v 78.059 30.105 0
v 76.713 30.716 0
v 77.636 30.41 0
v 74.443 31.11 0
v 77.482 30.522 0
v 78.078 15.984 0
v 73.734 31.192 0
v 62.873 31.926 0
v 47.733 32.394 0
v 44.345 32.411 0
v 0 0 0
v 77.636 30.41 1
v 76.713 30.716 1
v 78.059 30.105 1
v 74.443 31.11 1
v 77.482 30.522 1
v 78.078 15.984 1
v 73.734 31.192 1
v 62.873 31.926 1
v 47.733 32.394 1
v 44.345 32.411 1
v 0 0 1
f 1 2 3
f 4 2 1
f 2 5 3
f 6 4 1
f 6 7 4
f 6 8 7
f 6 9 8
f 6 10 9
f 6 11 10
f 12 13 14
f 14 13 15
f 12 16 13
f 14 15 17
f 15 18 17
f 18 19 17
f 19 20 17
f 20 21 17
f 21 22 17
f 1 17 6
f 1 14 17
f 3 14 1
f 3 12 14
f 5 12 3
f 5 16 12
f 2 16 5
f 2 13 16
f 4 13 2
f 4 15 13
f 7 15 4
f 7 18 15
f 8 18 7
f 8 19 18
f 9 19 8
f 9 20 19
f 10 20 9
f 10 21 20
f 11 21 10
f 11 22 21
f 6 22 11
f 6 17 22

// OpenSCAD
// Generated by SolidPython 1.1.3 on 2024-05-19 23:35:49


linear_extrude(height = 1) {
	polygon(points = [[0, 0], [78.0776399414, 15.9844062500], [78.0775609375, 16.0430000000], [78.0774819336, 16.1015937500], [78.0774029297, 16.1601875000], [78.0773239258, 16.2187812500], [78.0772449219, 16.2773750000], [78.0771659180, 16.3359687500], [78.0770869141, 16.3945625000], [78.0770079102, 16.4531562500], [78.0769289063, 16.5117500000], [78.0768499023, 16.5703437500], [78.0767708984, 16.6289375000], [78.0766918945, 16.6875312500], [78.0766128906, 16.7461250000], [78.0765338867, 16.8047187500], [78.0764548828, 16.8633125000], [78.0763758789, 16.9219062500], [78.0762968750, 16.9805000000], [78.0762178711, 17.0390937500], [78.0761388672, 17.0976875000], [78.0760598633, 17.1562812500], [78.0759808594, 17.2148750000], [78.0759018555, 17.2734687500], [78.0758228516, 17.3320625000], [78.0757438477, 17.3906562500], [78.0756648437, 17.4492500000], [78.0755858398, 17.5078437500], [78.0755068359, 17.5664375000], [78.0754278320, 17.6250312500], [78.0753488281, 17.6836250000], [78.0752698242, 17.7422187500], [78.0751908203, 17.8008125000], [78.0751118164, 17.8594062500], [78.0750328125, 17.9180000000], [78.0749538086, 17.9765937500], [78.0748748047, 18.0351875000], [78.0747958008, 18.0937812500], [78.0747167969, 18.1523750000], [78.0746377930, 18.2109687500], [78.0745587891, 18.2695625000], [78.0744797852, 18.3281562500], [78.0744007813, 18.3867500000], [78.0743217773, 18.4453437500], [78.0742427734, 18.5039375000], [78.0741637695, 18.5625312500], [78.0740847656, 18.6211250000], [78.0740057617, 18.6797187500], [78.0739267578, 18.7383125000], [78.0738477539, 18.7969062500], [78.0737687500, 18.8555000000], [78.0736897461, 18.9140937500], [78.0736107422, 18.9726875000], [78.0735317383, 19.0312812500], [78.0734527344, 19.0898750000], [78.0733737305, 19.1484687500], [78.0732947266, 19.2070625000], [78.0732157227, 19.2656562500], [78.0731367187, 19.3242500000], [78.0730577148, 19.3828437500], [78.0729787109, 19.4414375000], [78.0728997070, 19.5000312500], [78.0728207031, 19.5586250000], [78.0727416992, 19.6172187500], [78.0726626953, 19.6758125000], [78.0725836914, 19.7344062500], [78.0725046875, 19.7930000000], [78.0724256836, 19.8515937500], [78.0723466797, 19.9101875000], [78.0722676758, 19.9687812500], [78.0721886719, 20.0273750000], [78.0721096680, 20.0859687500], [78.0720306641, 20.1445625000], [78.0719516602, 20.2031562500], [78.0718726563, 20.2617500000], [78.0717936523, 20.3203437500], [78.0717146484, 20.3789375000], [78.0716356445, 20.4375312500], [78.0715566406, 20.4961250000], [78.0714776367, 20.5547187500], [78.0713986328, 20.6133125000], [78.0713196289, 20.6719062500], [78.0712406250, 20.7305000000], [78.0711616211, 20.7890937500], [78.0710826172, 20.8476875000], [78.0710036133, 20.9062812500], [78.0709246094, 20.9648750000], [78.0708456055, 21.0234687500], [78.0707666016, 21.0820625000], [78.0706875977, 21.1406562500], [78.0706085937, 21.1992500000], [78.0705295898, 21.2578437500], [78.0704505859, 21.3164375000], [78.0703715820, 21.3750312500], [78.0702925781, 21.4336250000], [78.0702135742, 21.4922187500], [78.0701345703, 21.5508125000], [78.0700555664, 21.6094062500], [78.0699765625, 21.6680000000], [78.0698975586, 21.7265937500], [78.0698185547, 21.7851875000], [78.0697395508, 21.8437812500], [78.0696605469, 21.9023750000], [78.0695815430, 21.9609687500], [78.0695025391, 22.0195625000], [78.0694235352, 22.0781562500], [78.0693445313, 22.1367500000], [78.0692655273, 22.1953437500], [78.0691865234, 22.2539375000], [78.0691075195, 22.3125312500], [78.0690285156, 22.3711250000], [78.0689495117, 22.4297187500], [78.0688705078, 22.4883125000], [78.0687915039, 22.5469062500], [78.0687125000, 22.6055000000], [78.0686334961, 22.6640937500], [78.0685544922, 22.7226875000], [78.0684754883, 22.7812812500], [78.0683964844, 22.8398750000], [78.0683174805, 22.8984687500], [78.0682384766, 22.9570625000], [78.0681594727, 23.0156562500], [78.0680804687, 23.0742500000], [78.0680014648, 23.1328437500], [78.0679224609, 23.1914375000], [78.0678434570, 23.2500312500], [78.0677644531, 23.3086250000], [78.0676854492, 23.3672187500], [78.0676064453, 23.4258125000], [78.0675274414, 23.4844062500], [78.0674484375, 23.5430000000], [78.0673694336, 23.6015937500], [78.0672904297, 23.6601875000], [78.0672114258, 23.7187812500], [78.0671324219, 23.7773750000], [78.0670534180, 23.8359687500], [78.0669744141, 23.8945625000], [78.0668954102, 23.9531562500], [78.0668164063, 24.0117500000], [78.0667374023, 24.0703437500], [78.0666583984, 24.1289375000], [78.0665793945, 24.1875312500], [78.0665003906, 24.2461250000], [78.0664213867, 24.3047187500], [78.0663423828, 24.3633125000], [78.0662633789, 24.4219062500], [78.0661843750, 24.4805000000], [78.0661053711, 24.5390937500], [78.0660263672, 24.5976875000], [78.0659473633, 24.6562812500], [78.0658683594, 24.7148750000], [78.0657893555, 24.7734687500], [78.0657103516, 24.8320625000], [78.0656313477, 24.8906562500], [78.0655523437, 24.9492500000], [78.0654733398, 25.0078437500], [78.0653943359, 25.0664375000], [78.0653153320, 25.1250312500], [78.0652363281, 25.1836250000], [78.0651573242, 25.2422187500], [78.0650783203, 25.3008125000], [78.0649993164, 25.3594062500], [78.0649203125, 25.4180000000], [78.0648413086, 25.4765937500], [78.0647623047, 25.5351875000], [78.0646833008, 25.5937812500], [78.0646042969, 25.6523750000], [78.0645252930, 25.7109687500], [78.0644462891, 25.7695625000], [78.0643672852, 25.8281562500], [78.0642882813, 25.8867500000], [78.0642092773, 25.9453437500], [78.0641302734, 26.0039375000], [78.0640512695, 26.0625312500], [78.0639722656, 26.1211250000], [78.0638932617, 26.1797187500], [78.0638142578, 26.2383125000], [78.0637352539, 26.2969062500], [78.0636562500, 26.3555000000], [78.0635772461, 26.4140937500], [78.0634982422, 26.4726875000], [78.0634192383, 26.5312812500], [78.0633402344, 26.5898750000], [78.0632612305, 26.6484687500], [78.0631822266, 26.7070625000], [78.0631032227, 26.7656562500], [78.0630242188, 26.8242500000], [78.0629452148, 26.8828437500], [78.0628662109, 26.9414375000], [78.0627872070, 27.0000312500], [78.0627082031, 27.0586250000], [78.0626291992, 27.1172187500], [78.0625501953, 27.1758125000], [78.0624711914, 27.2344062500], [78.0623921875, 27.2930000000], [78.0623131836, 27.3515937500], [78.0622341797, 27.4101875000], [78.0621551758, 27.4687812500], [78.0620761719, 27.5273750000], [78.0619971680, 27.5859687500], [78.0619181641, 27.6445625000], [78.0618391602, 27.7031562500], [78.0617601563, 27.7617500000], [78.0616811523, 27.8203437500], [78.0616021484, 27.8789375000], [78.0615231445, 27.9375312500], [78.0614441406, 27.9961250000], [78.0613651367, 28.0547187500], [78.0612861328, 28.1133125000], [78.0612071289, 28.1719062500], [78.0611281250, 28.2305000000], [78.0610491211, 28.2890937500], [78.0609701172, 28.3476875000], [78.0608911133, 28.4062812500], [78.0608121094, 28.4648750000], [78.0607331055, 28.5234687500], [78.0606541016, 28.5820625000], [78.0605750977, 28.6406562500], [78.0604960938, 28.6992500000], [78.0604170898, 28.7578437500], [78.0603380859, 28.8164375000], [78.0602590820, 28.8750312500], [78.0601800781, 28.9336250000], [78.0601010742, 28.9922187500], [78.0600220703, 29.0508125000], [78.0599430664, 29.1094062500], [78.0598640625, 29.1680000000], [78.0597850586, 29.2265937500], [78.0597060547, 29.2851875000], [78.0596270508, 29.3437812500], [78.0595480469, 29.4023750000], [78.0594690430, 29.4609687500], [78.0593900391, 29.5195625000], [78.0593110352, 29.5781562500], [78.0592320312, 29.6367500000], [78.0591530273, 29.6953437500], [78.0590740234, 29.7539375000], [78.0589950195, 29.8125312500], [78.0589160156, 29.8711250000], [78.0588370117, 29.9297187500], [78.0587580078, 29.9883125000], [78.0586790039, 30.0469062500], [78.0586000000, 30.1055000000], [78.0058000000, 30.1436000000], [77.9530000000, 30.1817000000], [77.9002000000, 30.2198000000], [77.8474000000, 30.2579000000], [77.7946000000, 30.2960000000], [77.7418000000, 30.3341000000], [77.6890000000, 30.3722000000], [77.6362000000, 30.4103000000], [77.5589000000, 30.4661000000], [77.4816000000, 30.5219000000], [77.3854875000, 30.5462000000], [77.2893750000, 30.5705000000], [77.1932625000, 30.5948000000], [77.0971500000, 30.6191000000], [77.0010375000, 30.6434000000], [76.9049250000, 30.6677000000], [76.8088125000, 30.6920000000], [76.7127000000, 30.7163000000], [76.6417687500, 30.7286187500], [76.5708375000, 30.7409375000], [76.4999062500, 30.7532562500], [76.4289750000, 30.7655750000], [76.3580437500, 30.7778937500], [76.2871125000, 30.7902125000], [76.2161812500, 30.8025312500], [76.1452500000, 30.8148500000], [76.0743187500, 30.8271687500], [76.0033875000, 30.8394875000], [75.9324562500, 30.8518062500], [75.8615250000, 30.8641250000], [75.7905937500, 30.8764437500], [75.7196625000, 30.8887625000], [75.6487312500, 30.9010812500], [75.5778000000, 30.9134000000], [75.5068687500, 30.9257187500], [75.4359375000, 30.9380375000], [75.3650062500, 30.9503562500], [75.2940750000, 30.9626750000], [75.2231437500, 30.9749937500], [75.1522125000, 30.9873125000], [75.0812812500, 30.9996312500], [75.0103500000, 31.0119500000], [74.9394187500, 31.0242687500], [74.8684875000, 31.0365875000], [74.7975562500, 31.0489062500], [74.7266250000, 31.0612250000], [74.6556937500, 31.0735437500], [74.5847625000, 31.0858625000], [74.5138312500, 31.0981812500], [74.4429000000, 31.1105000000], [74.3543375000, 31.1207500000], [74.2657750000, 31.1310000000], [74.1772125000, 31.1412500000], [74.0886500000, 31.1515000000], [74.0000875000, 31.1617500000], [73.9115250000, 31.1720000000], [73.8229625000, 31.1822500000], [73.7344000000, 31.1925000000], [73.6667000000, 31.1970718750], [73.5990000000, 31.2016437500], [73.5313000000, 31.2062156250], [73.4636000000, 31.2107875000], [73.3959000000, 31.2153593750], [73.3282000000, 31.2199312500], [73.2605000000, 31.2245031250], [73.1928000000, 31.2290750000], [73.1251000000, 31.2336468750], [73.0574000000, 31.2382187500], [72.9897000000, 31.2427906250], [72.9220000000, 31.2473625000], [72.8543000000, 31.2519343750], [72.7866000000, 31.2565062500], [72.7189000000, 31.2610781250], [72.6512000000, 31.2656500000], [72.5835000000, 31.2702218750], [72.5158000000, 31.2747937500], [72.4481000000, 31.2793656250], [72.3804000000, 31.2839375000], [72.3127000000, 31.2885093750], [72.2450000000, 31.2930812500], [72.1773000000, 31.2976531250], [72.1096000000, 31.3022250000], [72.0419000000, 31.3067968750], [71.9742000000, 31.3113687500], [71.9065000000, 31.3159406250], [71.8388000000, 31.3205125000], [71.7711000000, 31.3250843750], [71.7034000000, 31.3296562500], [71.6357000000, 31.3342281250], [71.5680000000, 31.3388000000], [71.5000734375, 31.3433867187], [71.4321468750, 31.3479734375], [71.3642203125, 31.3525601563], [71.2962937500, 31.3571468750], [71.2283671875, 31.3617335937], [71.1604406250, 31.3663203125], [71.0925140625, 31.3709070312], [71.0245875000, 31.3754937500], [70.9566609375, 31.3800804687], [70.8887343750, 31.3846671875], [70.8208078125, 31.3892539062], [70.7528812500, 31.3938406250], [70.6849546875, 31.3984273437], [70.6170281250, 31.4030140625], [70.5491015625, 31.4076007812], [70.4811750000, 31.4121875000], [70.4132484375, 31.4167742187], [70.3453218750, 31.4213609375], [70.2773953125, 31.4259476562], [70.2094687500, 31.4305343750], [70.1415421875, 31.4351210937], [70.0736156250, 31.4397078125], [70.0056890625, 31.4442945313], [69.9377625000, 31.4488812500], [69.8698359375, 31.4534679687], [69.8019093750, 31.4580546875], [69.7339828125, 31.4626414063], [69.6660562500, 31.4672281250], [69.5981296875, 31.4718148437], [69.5302031250, 31.4764015625], [69.4622765625, 31.4809882812], [69.3943500000, 31.4855750000], [69.3264234375, 31.4901617187], [69.2584968750, 31.4947484375], [69.1905703125, 31.4993351562], [69.1226437500, 31.5039218750], [69.0547171875, 31.5085085937], [68.9867906250, 31.5130953125], [68.9188640625, 31.5176820312], [68.8509375000, 31.5222687500], [68.7830109375, 31.5268554688], [68.7150843750, 31.5314421875], [68.6471578125, 31.5360289062], [68.5792312500, 31.5406156250], [68.5113046875, 31.5452023437], [68.4433781250, 31.5497890625], [68.3754515625, 31.5543757813], [68.3075250000, 31.5589625000], [68.2395984375, 31.5635492187], [68.1716718750, 31.5681359375], [68.1037453125, 31.5727226563], [68.0358187500, 31.5773093750], [67.9678921875, 31.5818960937], [67.8999656250, 31.5864828125], [67.8320390625, 31.5910695312], [67.7641125000, 31.5956562500], [67.6961859375, 31.6002429687], [67.6282593750, 31.6048296875], [67.5603328125, 31.6094164062], [67.4924062500, 31.6140031250], [67.4244796875, 31.6185898437], [67.3565531250, 31.6231765625], [67.2886265625, 31.6277632812], [67.2207000000, 31.6323500000], [67.1527734375, 31.6369367188], [67.0848468750, 31.6415234375], [67.0169203125, 31.6461101562], [66.9489937500, 31.6506968750], [66.8810671875, 31.6552835937], [66.8131406250, 31.6598703125], [66.7452140625, 31.6644570313], [66.6772875000, 31.6690437500], [66.6093609375, 31.6736304687], [66.5414343750, 31.6782171875], [66.4735078125, 31.6828039063], [66.4055812500, 31.6873906250], [66.3376546875, 31.6919773437], [66.2697281250, 31.6965640625], [66.2018015625, 31.7011507812], [66.1338750000, 31.7057375000], [66.0659484375, 31.7103242187], [65.9980218750, 31.7149109375], [65.9300953125, 31.7194976562], [65.8621687500, 31.7240843750], [65.7942421875, 31.7286710937], [65.7263156250, 31.7332578125], [65.6583890625, 31.7378445312], [65.5904625000, 31.7424312500], [65.5225359375, 31.7470179688], [65.4546093750, 31.7516046875], [65.3866828125, 31.7561914063], [65.3187562500, 31.7607781250], [65.2508296875, 31.7653648437], [65.1829031250, 31.7699515625], [65.1149765625, 31.7745382813], [65.0470500000, 31.7791250000], [64.9791234375, 31.7837117187], [64.9111968750, 31.7882984375], [64.8432703125, 31.7928851563], [64.7753437500, 31.7974718750], [64.7074171875, 31.8020585937], [64.6394906250, 31.8066453125], [64.5715640625, 31.8112320313], [64.5036375000, 31.8158187500], [64.4357109375, 31.8204054687], [64.3677843750, 31.8249921875], [64.2998578125, 31.8295789062], [64.2319312500, 31.8341656250], [64.1640046875, 31.8387523437], [64.0960781250, 31.8433390625], [64.0281515625, 31.8479257812], [63.9602250000, 31.8525125000], [63.8922984375, 31.8570992188], [63.8243718750, 31.8616859375], [63.7564453125, 31.8662726563], [63.6885187500, 31.8708593750], [63.6205921875, 31.8754460937], [63.5526656250, 31.8800328125], [63.4847390625, 31.8846195313], [63.4168125000, 31.8892062500], [63.3488859375, 31.8937929687], [63.2809593750, 31.8983796875], [63.2130328125, 31.9029664063], [63.1451062500, 31.9075531250], [63.0771796875, 31.9121398437], [63.0092531250, 31.9167265625], [62.9413265625, 31.9213132813], [62.8734000000, 31.9259000000], [62.8189488281, 31.9275851562], [62.7644976563, 31.9292703125], [62.7100464844, 31.9309554687], [62.6555953125, 31.9326406250], [62.6011441406, 31.9343257812], [62.5466929687, 31.9360109375], [62.4922417969, 31.9376960937], [62.4377906250, 31.9393812500], [62.3833394531, 31.9410664062], [62.3288882812, 31.9427515625], [62.2744371094, 31.9444367187], [62.2199859375, 31.9461218750], [62.1655347656, 31.9478070312], [62.1110835937, 31.9494921875], [62.0566324219, 31.9511773437], [62.0021812500, 31.9528625000], [61.9477300781, 31.9545476562], [61.8932789062, 31.9562328125], [61.8388277344, 31.9579179687], [61.7843765625, 31.9596031250], [61.7299253906, 31.9612882812], [61.6754742187, 31.9629734375], [61.6210230469, 31.9646585938], [61.5665718750, 31.9663437500], [61.5121207031, 31.9680289062], [61.4576695312, 31.9697140625], [61.4032183594, 31.9713992188], [61.3487671875, 31.9730843750], [61.2943160156, 31.9747695312], [61.2398648437, 31.9764546875], [61.1854136719, 31.9781398438], [61.1309625000, 31.9798250000], [61.0765113281, 31.9815101562], [61.0220601562, 31.9831953125], [60.9676089844, 31.9848804687], [60.9131578125, 31.9865656250], [60.8587066406, 31.9882507812], [60.8042554688, 31.9899359375], [60.7498042969, 31.9916210937], [60.6953531250, 31.9933062500], [60.6409019531, 31.9949914063], [60.5864507812, 31.9966765625], [60.5319996094, 31.9983617188], [60.4775484375, 32.0000468750], [60.4230972656, 32.0017320313], [60.3686460938, 32.0034171875], [60.3141949219, 32.0051023438], [60.2597437500, 32.0067875000], [60.2052925781, 32.0084726562], [60.1508414062, 32.0101578125], [60.0963902344, 32.0118429688], [60.0419390625, 32.0135281250], [59.9874878906, 32.0152132812], [59.9330367188, 32.0168984375], [59.8785855469, 32.0185835938], [59.8241343750, 32.0202687500], [59.7696832031, 32.0219539062], [59.7152320312, 32.0236390625], [59.6607808594, 32.0253242188], [59.6063296875, 32.0270093750], [59.5518785156, 32.0286945312], [59.4974273438, 32.0303796875], [59.4429761719, 32.0320648437], [59.3885250000, 32.0337500000], [59.3340738281, 32.0354351562], [59.2796226562, 32.0371203125], [59.2251714844, 32.0388054687], [59.1707203125, 32.0404906250], [59.1162691406, 32.0421757812], [59.0618179688, 32.0438609375], [59.0073667969, 32.0455460937], [58.9529156250, 32.0472312500], [58.8984644531, 32.0489164062], [58.8440132812, 32.0506015625], [58.7895621094, 32.0522867187], [58.7351109375, 32.0539718750], [58.6806597656, 32.0556570312], [58.6262085938, 32.0573421875], [58.5717574219, 32.0590273437], [58.5173062500, 32.0607125000], [58.4628550781, 32.0623976562], [58.4084039063, 32.0640828125], [58.3539527344, 32.0657679687], [58.2995015625, 32.0674531250], [58.2450503906, 32.0691382812], [58.1905992188, 32.0708234375], [58.1361480469, 32.0725085937], [58.0816968750, 32.0741937500], [58.0272457031, 32.0758789062], [57.9727945313, 32.0775640625], [57.9183433594, 32.0792492187], [57.8638921875, 32.0809343750], [57.8094410156, 32.0826195312], [57.7549898437, 32.0843046875], [57.7005386719, 32.0859898437], [57.6460875000, 32.0876750000], [57.5916363281, 32.0893601562], [57.5371851563, 32.0910453125], [57.4827339844, 32.0927304687], [57.4282828125, 32.0944156250], [57.3738316406, 32.0961007813], [57.3193804687, 32.0977859375], [57.2649292969, 32.0994710937], [57.2104781250, 32.1011562500], [57.1560269531, 32.1028414063], [57.1015757812, 32.1045265625], [57.0471246094, 32.1062117188], [56.9926734375, 32.1078968750], [56.9382222656, 32.1095820312], [56.8837710937, 32.1112671875], [56.8293199219, 32.1129523438], [56.7748687500, 32.1146375000], [56.7204175781, 32.1163226562], [56.6659664062, 32.1180078125], [56.6115152344, 32.1196929688], [56.5570640625, 32.1213781250], [56.5026128906, 32.1230632812], [56.4481617188, 32.1247484375], [56.3937105469, 32.1264335938], [56.3392593750, 32.1281187500], [56.2848082031, 32.1298039062], [56.2303570312, 32.1314890625], [56.1759058594, 32.1331742187], [56.1214546875, 32.1348593750], [56.0670035156, 32.1365445312], [56.0125523438, 32.1382296875], [55.9581011719, 32.1399148437], [55.9036500000, 32.1416000000], [55.8491988281, 32.1432851562], [55.7947476562, 32.1449703125], [55.7402964844, 32.1466554687], [55.6858453125, 32.1483406250], [55.6313941406, 32.1500257812], [55.5769429688, 32.1517109375], [55.5224917969, 32.1533960937], [55.4680406250, 32.1550812500], [55.4135894531, 32.1567664062], [55.3591382812, 32.1584515625], [55.3046871094, 32.1601367187], [55.2502359375, 32.1618218750], [55.1957847656, 32.1635070312], [55.1413335938, 32.1651921875], [55.0868824219, 32.1668773437], [55.0324312500, 32.1685625000], [54.9779800781, 32.1702476562], [54.9235289062, 32.1719328125], [54.8690777344, 32.1736179687], [54.8146265625, 32.1753031250], [54.7601753906, 32.1769882812], [54.7057242188, 32.1786734375], [54.6512730469, 32.1803585937], [54.5968218750, 32.1820437500], [54.5423707031, 32.1837289062], [54.4879195313, 32.1854140625], [54.4334683594, 32.1870992187], [54.3790171875, 32.1887843750], [54.3245660156, 32.1904695312], [54.2701148437, 32.1921546875], [54.2156636719, 32.1938398437], [54.1612125000, 32.1955250000], [54.1067613281, 32.1972101562], [54.0523101563, 32.1988953125], [53.9978589844, 32.2005804687], [53.9434078125, 32.2022656250], [53.8889566406, 32.2039507813], [53.8345054687, 32.2056359375], [53.7800542969, 32.2073210937], [53.7256031250, 32.2090062500], [53.6711519531, 32.2106914062], [53.6167007812, 32.2123765625], [53.5622496094, 32.2140617188], [53.5077984375, 32.2157468750], [53.4533472656, 32.2174320312], [53.3988960937, 32.2191171875], [53.3444449219, 32.2208023438], [53.2899937500, 32.2224875000], [53.2355425781, 32.2241726562], [53.1810914062, 32.2258578125], [53.1266402344, 32.2275429688], [53.0721890625, 32.2292281250], [53.0177378906, 32.2309132812], [52.9632867187, 32.2325984375], [52.9088355469, 32.2342835937], [52.8543843750, 32.2359687500], [52.7999332031, 32.2376539062], [52.7454820312, 32.2393390625], [52.6910308594, 32.2410242187], [52.6365796875, 32.2427093750], [52.5821285156, 32.2443945312], [52.5276773437, 32.2460796875], [52.4732261719, 32.2477648437], [52.4187750000, 32.2494500000], [52.3643238281, 32.2511351562], [52.3098726562, 32.2528203125], [52.2554214844, 32.2545054687], [52.2009703125, 32.2561906250], [52.1465191406, 32.2578757812], [52.0920679688, 32.2595609375], [52.0376167969, 32.2612460937], [51.9831656250, 32.2629312500], [51.9287144531, 32.2646164062], [51.8742632812, 32.2663015625], [51.8198121094, 32.2679867187], [51.7653609375, 32.2696718750], [51.7109097656, 32.2713570312], [51.6564585938, 32.2730421875], [51.6020074219, 32.2747273438], [51.5475562500, 32.2764125000], [51.4931050781, 32.2780976562], [51.4386539062, 32.2797828125], [51.3842027344, 32.2814679688], [51.3297515625, 32.2831531250], [51.2753003906, 32.2848382813], [51.2208492188, 32.2865234375], [51.1663980469, 32.2882085937], [51.1119468750, 32.2898937500], [51.0574957031, 32.2915789063], [51.0030445312, 32.2932640625], [50.9485933594, 32.2949492188], [50.8941421875, 32.2966343750], [50.8396910156, 32.2983195313], [50.7852398438, 32.3000046875], [50.7307886719, 32.3016898438], [50.6763375000, 32.3033750000], [50.6218863281, 32.3050601563], [50.5674351562, 32.3067453125], [50.5129839844, 32.3084304688], [50.4585328125, 32.3101156250], [50.4040816406, 32.3118007812], [50.3496304688, 32.3134859375], [50.2951792969, 32.3151710938], [50.2407281250, 32.3168562500], [50.1862769531, 32.3185414062], [50.1318257813, 32.3202265625], [50.0773746094, 32.3219117188], [50.0229234375, 32.3235968750], [49.9684722656, 32.3252820312], [49.9140210938, 32.3269671875], [49.8595699219, 32.3286523438], [49.8051187500, 32.3303375000], [49.7506675781, 32.3320226562], [49.6962164063, 32.3337078125], [49.6417652344, 32.3353929687], [49.5873140625, 32.3370781250], [49.5328628906, 32.3387632812], [49.4784117188, 32.3404484375], [49.4239605469, 32.3421335937], [49.3695093750, 32.3438187500], [49.3150582031, 32.3455039063], [49.2606070313, 32.3471890625], [49.2061558594, 32.3488742187], [49.1517046875, 32.3505593750], [49.0972535156, 32.3522445313], [49.0428023437, 32.3539296875], [48.9883511719, 32.3556148438], [48.9339000000, 32.3573000000], [48.8588312500, 32.3596250000], [48.7837625000, 32.3619500000], [48.7086937500, 32.3642750000], [48.6336250000, 32.3666000000], [48.5585562500, 32.3689250000], [48.4834875000, 32.3712500000], [48.4084187500, 32.3735750000], [48.3333500000, 32.3759000000], [48.2582812500, 32.3782250000], [48.1832125000, 32.3805500000], [48.1081437500, 32.3828750000], [48.0330750000, 32.3852000000], [47.9580062500, 32.3875250000], [47.8829375000, 32.3898500000], [47.8078687500, 32.3921750000], [47.7328000000, 32.3945000000], [47.6501734375, 32.3949117187], [47.5675468750, 32.3953234375], [47.4849203125, 32.3957351562], [47.4022937500, 32.3961468750], [47.3196671875, 32.3965585938], [47.2370406250, 32.3969703125], [47.1544140625, 32.3973820313], [47.0717875000, 32.3977937500], [46.9891609375, 32.3982054688], [46.9065343750, 32.3986171875], [46.8239078125, 32.3990289063], [46.7412812500, 32.3994406250], [46.6586546875, 32.3998523437], [46.5760281250, 32.4002640625], [46.4934015625, 32.4006757813], [46.4107750000, 32.4010875000], [46.3281484375, 32.4014992188], [46.2455218750, 32.4019109375], [46.1628953125, 32.4023226563], [46.0802687500, 32.4027343750], [45.9976421875, 32.4031460937], [45.9150156250, 32.4035578125], [45.8323890625, 32.4039695312], [45.7497625000, 32.4043812500], [45.6671359375, 32.4047929688], [45.5845093750, 32.4052046875], [45.5018828125, 32.4056164063], [45.4192562500, 32.4060281250], [45.3366296875, 32.4064398437], [45.2540031250, 32.4068515625], [45.1713765625, 32.4072632812], [45.0887500000, 32.4076750000], [45.0061234375, 32.4080867187], [44.9234968750, 32.4084984375], [44.8408703125, 32.4089101563], [44.7582437500, 32.4093218750], [44.6756171875, 32.4097335937], [44.5929906250, 32.4101453125], [44.5103640625, 32.4105570312], [44.4277375000, 32.4109687500], [44.3451109375, 32.4113804687]]);
}
/***********************************************
*********      SolidPython code:      **********
************************************************
 
import math
import time

from stl import mesh, Dimension

from tkinter import Tk     # from tkinter import Tk for Python 3.x
from tkinter.filedialog import askopenfilename
from mpl_toolkits.mplot3d import art3d
from matplotlib import pyplot as plt
import solid
import os
import ezdxf
import shapely.geometry as sg
import subprocess
from GUI import getSCADPath



def outputSTL(From, To, PATH=getSCADPath()):
    subprocess.Popen(PATH + " -o " + To + " " + From)
    while not os.path.exists(To):
        time.sleep(1)


def get_size(i):
    x_list = [int(a) for a in str(i)]
    return len(x_list)



class Model:
    def __init__(self, model, fileName, location, layer, thickness):
        self.location = location
        self.code = None
        self.fileName = fileName
        self.stl = fileName + ".stl"
        self.layer = layer
        self.thickness = thickness
        self.maxz = (layer+1)*thickness
        self.dxf = fileName + ".dxf"
        self.scad = fileName + ".scad"
        self.model = model
        self.center = None
        self.width = 10
        self.mesh = None
        self.useable_area = None


    def get_code(self):
        max_dim = 0.05
        max_array = 6

        num = int(self.fileName)
        nums = [int(a) for a in str(num)]
        nums.reverse()
        indices = nums
        length = len(nums)

        print(indices)
        t = 0
        i = 0
        cubes = []
        x = 0
        y = 0
        width = 0.01
        while x <= max_dim:
            while y <= max_dim:
                print(indices)
                if nums == []:
                    break
                if indices[0] != 0:
                    cubes.append(solid.translate([x, y, 0])(solid.cube(size=t / 1000 + 0.001)))
                    y += max_dim / (max_array - 1)
                    nums[0] = nums[0] - 1
                else:
                    indices.pop(0)
                    t += 1
                i += 1
            x += max_dim / (max_array - 1)
            y = 0

        outside = solid.translate([-width / 2, -width / 2])(solid.cube(max_dim + (length - 1) / 1000 + 0.001 + width))
        self.code = solid.difference()(outside, cubes)
        self.code = solid.projection(cut=True)(self.code)
        solid.scad_render_to_file(self.code, self.location + "/code.scad")
        outputSTL(From=self.location+"/code.scad", To=self.location+"code.dxf", PATH=getSCADPath())
        # os.system("toSTL.sh renders/code.scad renders/code.dxf")
        return self.location+"/code.dxf"

    def download(self, type):
        if type =="stl":
            print("generating:" + self.location+"/"+ self.fileName+".stl")
            outputSTL(From=self.location+"/"+self.fileName+".scad", To=self.location+"/"+self.fileName+".stl")
            # os.system("toSTL.sh renders/"+ self.fileName+".scad renders/"+ self.fileName+".stl")
        elif type == "dxf":
            outputSTL(From=self.location+"/"+self.fileName+".scad", To=self.location+"/"+self.fileName+".dxf")
            # os.system("toSTL.sh renders/"+ self.fileName+".scad renders/"+ self.fileName+".dxf")

    def render(self):
        solid.scad_render_to_file(self.model, self.location+"/"+ self.fileName+'.scad')
        while not os.path.exists(self.location+"/"+self.fileName+".scad"):
            time.sleep(1)

    def get_points(self):
        doc = ezdxf.readfile(filename=self.location+"/"+ self.fileName+".dxf")
        msp = doc.modelspace()
        i=0
        lists = []
        def helper(e):
            start = [e.dxf.start[0], e.dxf.start[1]]
            end = [e.dxf.end[0], e.dxf.end[1]]
            return [start, end]

        for e in msp.query("LINE"):
            line = helper(e)
            if not lists:
                lists.append([line])
            else:
                if lists[i][len(lists)-1][1] != line[0]:
                    lists.append([line])
                    i+=1
                else:
                    lists[i].append(line)

    def get_points2(self, FILE):
        doc = ezdxf.readfile(filename=FILE)
        msp = doc.modelspace()
        i = 0
        lists = []

        def helper(e):
            start = [e.dxf.start[0], e.dxf.start[1]]
            end = [e.dxf.end[0], e.dxf.end[1]]
            return (start, end)

        for e in msp.query("LINE"):
            line = helper(e)
            if lists==[]:
                lists.append([line])
            else:
                if lists[i][len(lists[i]) - 1][1] != line[0]:
                    lists.append([line])
                    i += 1
                else:
                    lists[i].append(line)
        return lists

    def add_code(self):
        dxf = solid.projection(cut=False)(self.model)
        offset = solid.offset(r=-0.1)(dxf)
        solid.scad_render_to_file(offset, self.location+'/offset.scad')
        os.system("toSTL.sh renders/offset.scad renders/offset.dxf")
        lines = self.get_points2("renders/offset.dxf")
        x = lines[0][0][0][0]
        y = lines[0][0][0][1]
        print(x)
        print(y)
        code = solid.translate([x,y,0])(self.code)
        code = solid.linear_extrude(height=999)(code)
        save = self.model
        self.model = solid.projection()(solid.difference()(self.model, code))
        self.render()
        self.download("dxf")
        self.model = save

    def add_label(self, pos):
        # num = 12
        # minx, maxx, miny, maxy, minz, maxz = self.find_minmax()
        maxz = self.maxz
        # label = solid.linear_extrude(height=(maxz-minz)/3)(solid.text(str(self.fileName), size=0.5, halign="center"))
        # i=minx
        # print("x-len: " + str(maxx-minx))
        # print(i)
        # inc = (maxx-minx)/num
        # while minx <= i <= maxx:
        #     label = solid.union()(solid.translate([i, 0, maxz - 0.2])(solid.linear_extrude(height=(maxz-minz)/3)(solid.text(str(self.fileName), size=0.25, halign="center"))), label)
        #     i += inc
        #
        # l = label
        #
        # i =miny
        # while miny<= i <= maxy:
        #     print("y inc")
        #     l = solid.union()(solid.translate([0, i, 0])(label), l)
        #     i += 0.5
        for i in str(self.fileName):
            cur = pos[0]
            label = solid.translate([pos[0][0], pos[0][1], self.maxz-0.2])(solid.linear_extrude(height=(self.thickness)/3)(solid.text(str(i), size=0.5, halign="center", valign="center")))
            self.model = solid.difference()(self.model, label)
            pos.append(pos.pop(0))
            while abs(cur[0]-pos[0][0])<0.5 and abs(cur[1]-pos[0][1])<0.5:
                pos.append(pos.pop(0))



    def Center(self):

        volume, cog, inertia = self.mesh.get_mass_properties()
        print("Volume                                  = {0}".format(volume))
        print("Position of the center of gravity (COG) = {0}".format(cog))
        m_centered = solid.translate([-cog[0], -cog[1], 0])(
            self.model
        )
        return m_centered

    def find_minmax(self):
        minx = maxx = miny = maxy = minz = maxz = None
        for p in self.mesh.points:
            # p contains (x, y, z)
            if minx is None:
                minx = p[Dimension.X]
                maxx = p[Dimension.X]
                miny = p[Dimension.Y]
                maxy = p[Dimension.Y]
                minz = p[Dimension.Z]
                maxz = p[Dimension.Z]
            else:
                maxx = max(p[Dimension.X], maxx)
                minx = min(p[Dimension.X], minx)
                maxy = max(p[Dimension.Y], maxy)
                miny = min(p[Dimension.Y], miny)
                maxz = max(p[Dimension.Z], maxz)
                minz = min(p[Dimension.Z], minz)
        lenx = maxx - minx
        leny = maxy - miny
        lenz = maxz - minz
        return minx, maxx, miny, maxy, minz, maxz

    # def generate_Mesh(self):
    #     self.mesh = mesh.Mesh.from_file(self.location + "/" + str(int(self.fileName)//8)+ "b.stl")

    def get_top(self):
        top = solid.projection(cut=True)(solid.translate([0,0,-1*self.thickness*(self.layer+1)])(self.model))
        useable_area = solid.offset(r=-0.45)(top)
        self.useable_area = useable_area
        solid.scad_render_to_file(self.useable_area, self.location+'/' + 'toptemp.scad')
        outputSTL(From=self.location+'/' + 'toptemp.scad', To=self.location+"/top"+ self.dxf)

        # os.system("toSTL.sh out/toptemp.scad renders/" + self.fileName + ".dxf")
        dxf = DXF(self.location+"/top"+ self.dxf)
        min_p=dxf.points[0][0]
        points_ordered = dxf.points
        i=0
        while i <= len(dxf.points)+1:
            while math.sqrt((dxf.points[0][0]-dxf.points[1][0])**2+(dxf.points[0][1]-dxf.points[1][1])**2) > 0.1:
                dxf.points.insert(1, [(dxf.points[0][0]+dxf.points[1][0])/2, (dxf.points[0][1]+dxf.points[1][1])/2])
                i = i-1
            dxf.points.append(dxf.points.pop(0))
            i+=1
        for i in range(len(dxf.points)):
            dxf.points.append(dxf.points.pop(0))
            if dxf.points[0][0] < min_p:
                min_p = dxf.points[0][0]
                points_ordered = dxf.points.copy()
        dxf.points = points_ordered.copy()

        print(dxf.points)
        self.add_label(dxf.points)

class DXF:
    def __init__(self, file):
        self.file = file
        self.Lines = []
        self.points = []
        doc = ezdxf.readfile(self.file)
        msp = doc.modelspace()
        for e in msp:
            if e.dxftype() == "LINE":
                self.Lines.append(e)
                self.points.append([e.dxf.start[0], e.dxf.start[1]])
        # self.points.append([self.Lines[-1].dxf.end[0], self.Lines[-1].dxf.end[1]])
        self.area = None
        self.center = None
        self.polygon = sg.Polygon(self.points)

    def get_area(self):
        self.area = self.polygon.area
        return self.area

    def get_center(self):
        x_sum = 0
        y_sum =0
        for i in self.points:
            x_sum += i[0]
            y_sum += i[1]
        x_c = x_sum/len(self.points)
        y_c = y_sum/len(self.points)
        return (x_c, y_c)

    def split(self, maxdim):
        splits = []
        length = 0
        pieces = [[]]
        prev = self.points[0]
        for j in self.points:
            length = length + math.sqrt((prev[0]-j[0])**2+(prev[1]-j[1])**2)
            if length >= maxdim:
                pieces[-1].append(j)
                pieces.append([])
                length = 0
            pieces[-1].append(j)
            prev = j
        for j in pieces:
            j.insert(0, [0,0])
            piece = solid.linear_extrude(height=1)(solid.polygon(j))
            splits.append(piece)
        return splits
    def refine_points(self):
        i=0
        while i <= len(self.points)+1:
            while math.sqrt((self.points[0][0]-self.points[1][0])**2+(self.points[0][1]-self.points[1][1])**2) > 0.1:
                self.points.insert(1, [(self.points[0][0]+self.points[1][0])/2, (self.points[0][1]+self.points[1][1])/2])
                i = i-1
            self.points.append(self.points.pop(0))
            i+=1


if __name__== "__main__":
    test = DXF("C:/Users/Daniel/Documents/repos/Shell_Maker/output/0top_slice.dxf")
    test.refine_points()
    k = test.split(48)
    for i in range(len(k)):
        solid.scad_render_to_file(k[i], str(i) + ".scad")


 
 
************************************************/
